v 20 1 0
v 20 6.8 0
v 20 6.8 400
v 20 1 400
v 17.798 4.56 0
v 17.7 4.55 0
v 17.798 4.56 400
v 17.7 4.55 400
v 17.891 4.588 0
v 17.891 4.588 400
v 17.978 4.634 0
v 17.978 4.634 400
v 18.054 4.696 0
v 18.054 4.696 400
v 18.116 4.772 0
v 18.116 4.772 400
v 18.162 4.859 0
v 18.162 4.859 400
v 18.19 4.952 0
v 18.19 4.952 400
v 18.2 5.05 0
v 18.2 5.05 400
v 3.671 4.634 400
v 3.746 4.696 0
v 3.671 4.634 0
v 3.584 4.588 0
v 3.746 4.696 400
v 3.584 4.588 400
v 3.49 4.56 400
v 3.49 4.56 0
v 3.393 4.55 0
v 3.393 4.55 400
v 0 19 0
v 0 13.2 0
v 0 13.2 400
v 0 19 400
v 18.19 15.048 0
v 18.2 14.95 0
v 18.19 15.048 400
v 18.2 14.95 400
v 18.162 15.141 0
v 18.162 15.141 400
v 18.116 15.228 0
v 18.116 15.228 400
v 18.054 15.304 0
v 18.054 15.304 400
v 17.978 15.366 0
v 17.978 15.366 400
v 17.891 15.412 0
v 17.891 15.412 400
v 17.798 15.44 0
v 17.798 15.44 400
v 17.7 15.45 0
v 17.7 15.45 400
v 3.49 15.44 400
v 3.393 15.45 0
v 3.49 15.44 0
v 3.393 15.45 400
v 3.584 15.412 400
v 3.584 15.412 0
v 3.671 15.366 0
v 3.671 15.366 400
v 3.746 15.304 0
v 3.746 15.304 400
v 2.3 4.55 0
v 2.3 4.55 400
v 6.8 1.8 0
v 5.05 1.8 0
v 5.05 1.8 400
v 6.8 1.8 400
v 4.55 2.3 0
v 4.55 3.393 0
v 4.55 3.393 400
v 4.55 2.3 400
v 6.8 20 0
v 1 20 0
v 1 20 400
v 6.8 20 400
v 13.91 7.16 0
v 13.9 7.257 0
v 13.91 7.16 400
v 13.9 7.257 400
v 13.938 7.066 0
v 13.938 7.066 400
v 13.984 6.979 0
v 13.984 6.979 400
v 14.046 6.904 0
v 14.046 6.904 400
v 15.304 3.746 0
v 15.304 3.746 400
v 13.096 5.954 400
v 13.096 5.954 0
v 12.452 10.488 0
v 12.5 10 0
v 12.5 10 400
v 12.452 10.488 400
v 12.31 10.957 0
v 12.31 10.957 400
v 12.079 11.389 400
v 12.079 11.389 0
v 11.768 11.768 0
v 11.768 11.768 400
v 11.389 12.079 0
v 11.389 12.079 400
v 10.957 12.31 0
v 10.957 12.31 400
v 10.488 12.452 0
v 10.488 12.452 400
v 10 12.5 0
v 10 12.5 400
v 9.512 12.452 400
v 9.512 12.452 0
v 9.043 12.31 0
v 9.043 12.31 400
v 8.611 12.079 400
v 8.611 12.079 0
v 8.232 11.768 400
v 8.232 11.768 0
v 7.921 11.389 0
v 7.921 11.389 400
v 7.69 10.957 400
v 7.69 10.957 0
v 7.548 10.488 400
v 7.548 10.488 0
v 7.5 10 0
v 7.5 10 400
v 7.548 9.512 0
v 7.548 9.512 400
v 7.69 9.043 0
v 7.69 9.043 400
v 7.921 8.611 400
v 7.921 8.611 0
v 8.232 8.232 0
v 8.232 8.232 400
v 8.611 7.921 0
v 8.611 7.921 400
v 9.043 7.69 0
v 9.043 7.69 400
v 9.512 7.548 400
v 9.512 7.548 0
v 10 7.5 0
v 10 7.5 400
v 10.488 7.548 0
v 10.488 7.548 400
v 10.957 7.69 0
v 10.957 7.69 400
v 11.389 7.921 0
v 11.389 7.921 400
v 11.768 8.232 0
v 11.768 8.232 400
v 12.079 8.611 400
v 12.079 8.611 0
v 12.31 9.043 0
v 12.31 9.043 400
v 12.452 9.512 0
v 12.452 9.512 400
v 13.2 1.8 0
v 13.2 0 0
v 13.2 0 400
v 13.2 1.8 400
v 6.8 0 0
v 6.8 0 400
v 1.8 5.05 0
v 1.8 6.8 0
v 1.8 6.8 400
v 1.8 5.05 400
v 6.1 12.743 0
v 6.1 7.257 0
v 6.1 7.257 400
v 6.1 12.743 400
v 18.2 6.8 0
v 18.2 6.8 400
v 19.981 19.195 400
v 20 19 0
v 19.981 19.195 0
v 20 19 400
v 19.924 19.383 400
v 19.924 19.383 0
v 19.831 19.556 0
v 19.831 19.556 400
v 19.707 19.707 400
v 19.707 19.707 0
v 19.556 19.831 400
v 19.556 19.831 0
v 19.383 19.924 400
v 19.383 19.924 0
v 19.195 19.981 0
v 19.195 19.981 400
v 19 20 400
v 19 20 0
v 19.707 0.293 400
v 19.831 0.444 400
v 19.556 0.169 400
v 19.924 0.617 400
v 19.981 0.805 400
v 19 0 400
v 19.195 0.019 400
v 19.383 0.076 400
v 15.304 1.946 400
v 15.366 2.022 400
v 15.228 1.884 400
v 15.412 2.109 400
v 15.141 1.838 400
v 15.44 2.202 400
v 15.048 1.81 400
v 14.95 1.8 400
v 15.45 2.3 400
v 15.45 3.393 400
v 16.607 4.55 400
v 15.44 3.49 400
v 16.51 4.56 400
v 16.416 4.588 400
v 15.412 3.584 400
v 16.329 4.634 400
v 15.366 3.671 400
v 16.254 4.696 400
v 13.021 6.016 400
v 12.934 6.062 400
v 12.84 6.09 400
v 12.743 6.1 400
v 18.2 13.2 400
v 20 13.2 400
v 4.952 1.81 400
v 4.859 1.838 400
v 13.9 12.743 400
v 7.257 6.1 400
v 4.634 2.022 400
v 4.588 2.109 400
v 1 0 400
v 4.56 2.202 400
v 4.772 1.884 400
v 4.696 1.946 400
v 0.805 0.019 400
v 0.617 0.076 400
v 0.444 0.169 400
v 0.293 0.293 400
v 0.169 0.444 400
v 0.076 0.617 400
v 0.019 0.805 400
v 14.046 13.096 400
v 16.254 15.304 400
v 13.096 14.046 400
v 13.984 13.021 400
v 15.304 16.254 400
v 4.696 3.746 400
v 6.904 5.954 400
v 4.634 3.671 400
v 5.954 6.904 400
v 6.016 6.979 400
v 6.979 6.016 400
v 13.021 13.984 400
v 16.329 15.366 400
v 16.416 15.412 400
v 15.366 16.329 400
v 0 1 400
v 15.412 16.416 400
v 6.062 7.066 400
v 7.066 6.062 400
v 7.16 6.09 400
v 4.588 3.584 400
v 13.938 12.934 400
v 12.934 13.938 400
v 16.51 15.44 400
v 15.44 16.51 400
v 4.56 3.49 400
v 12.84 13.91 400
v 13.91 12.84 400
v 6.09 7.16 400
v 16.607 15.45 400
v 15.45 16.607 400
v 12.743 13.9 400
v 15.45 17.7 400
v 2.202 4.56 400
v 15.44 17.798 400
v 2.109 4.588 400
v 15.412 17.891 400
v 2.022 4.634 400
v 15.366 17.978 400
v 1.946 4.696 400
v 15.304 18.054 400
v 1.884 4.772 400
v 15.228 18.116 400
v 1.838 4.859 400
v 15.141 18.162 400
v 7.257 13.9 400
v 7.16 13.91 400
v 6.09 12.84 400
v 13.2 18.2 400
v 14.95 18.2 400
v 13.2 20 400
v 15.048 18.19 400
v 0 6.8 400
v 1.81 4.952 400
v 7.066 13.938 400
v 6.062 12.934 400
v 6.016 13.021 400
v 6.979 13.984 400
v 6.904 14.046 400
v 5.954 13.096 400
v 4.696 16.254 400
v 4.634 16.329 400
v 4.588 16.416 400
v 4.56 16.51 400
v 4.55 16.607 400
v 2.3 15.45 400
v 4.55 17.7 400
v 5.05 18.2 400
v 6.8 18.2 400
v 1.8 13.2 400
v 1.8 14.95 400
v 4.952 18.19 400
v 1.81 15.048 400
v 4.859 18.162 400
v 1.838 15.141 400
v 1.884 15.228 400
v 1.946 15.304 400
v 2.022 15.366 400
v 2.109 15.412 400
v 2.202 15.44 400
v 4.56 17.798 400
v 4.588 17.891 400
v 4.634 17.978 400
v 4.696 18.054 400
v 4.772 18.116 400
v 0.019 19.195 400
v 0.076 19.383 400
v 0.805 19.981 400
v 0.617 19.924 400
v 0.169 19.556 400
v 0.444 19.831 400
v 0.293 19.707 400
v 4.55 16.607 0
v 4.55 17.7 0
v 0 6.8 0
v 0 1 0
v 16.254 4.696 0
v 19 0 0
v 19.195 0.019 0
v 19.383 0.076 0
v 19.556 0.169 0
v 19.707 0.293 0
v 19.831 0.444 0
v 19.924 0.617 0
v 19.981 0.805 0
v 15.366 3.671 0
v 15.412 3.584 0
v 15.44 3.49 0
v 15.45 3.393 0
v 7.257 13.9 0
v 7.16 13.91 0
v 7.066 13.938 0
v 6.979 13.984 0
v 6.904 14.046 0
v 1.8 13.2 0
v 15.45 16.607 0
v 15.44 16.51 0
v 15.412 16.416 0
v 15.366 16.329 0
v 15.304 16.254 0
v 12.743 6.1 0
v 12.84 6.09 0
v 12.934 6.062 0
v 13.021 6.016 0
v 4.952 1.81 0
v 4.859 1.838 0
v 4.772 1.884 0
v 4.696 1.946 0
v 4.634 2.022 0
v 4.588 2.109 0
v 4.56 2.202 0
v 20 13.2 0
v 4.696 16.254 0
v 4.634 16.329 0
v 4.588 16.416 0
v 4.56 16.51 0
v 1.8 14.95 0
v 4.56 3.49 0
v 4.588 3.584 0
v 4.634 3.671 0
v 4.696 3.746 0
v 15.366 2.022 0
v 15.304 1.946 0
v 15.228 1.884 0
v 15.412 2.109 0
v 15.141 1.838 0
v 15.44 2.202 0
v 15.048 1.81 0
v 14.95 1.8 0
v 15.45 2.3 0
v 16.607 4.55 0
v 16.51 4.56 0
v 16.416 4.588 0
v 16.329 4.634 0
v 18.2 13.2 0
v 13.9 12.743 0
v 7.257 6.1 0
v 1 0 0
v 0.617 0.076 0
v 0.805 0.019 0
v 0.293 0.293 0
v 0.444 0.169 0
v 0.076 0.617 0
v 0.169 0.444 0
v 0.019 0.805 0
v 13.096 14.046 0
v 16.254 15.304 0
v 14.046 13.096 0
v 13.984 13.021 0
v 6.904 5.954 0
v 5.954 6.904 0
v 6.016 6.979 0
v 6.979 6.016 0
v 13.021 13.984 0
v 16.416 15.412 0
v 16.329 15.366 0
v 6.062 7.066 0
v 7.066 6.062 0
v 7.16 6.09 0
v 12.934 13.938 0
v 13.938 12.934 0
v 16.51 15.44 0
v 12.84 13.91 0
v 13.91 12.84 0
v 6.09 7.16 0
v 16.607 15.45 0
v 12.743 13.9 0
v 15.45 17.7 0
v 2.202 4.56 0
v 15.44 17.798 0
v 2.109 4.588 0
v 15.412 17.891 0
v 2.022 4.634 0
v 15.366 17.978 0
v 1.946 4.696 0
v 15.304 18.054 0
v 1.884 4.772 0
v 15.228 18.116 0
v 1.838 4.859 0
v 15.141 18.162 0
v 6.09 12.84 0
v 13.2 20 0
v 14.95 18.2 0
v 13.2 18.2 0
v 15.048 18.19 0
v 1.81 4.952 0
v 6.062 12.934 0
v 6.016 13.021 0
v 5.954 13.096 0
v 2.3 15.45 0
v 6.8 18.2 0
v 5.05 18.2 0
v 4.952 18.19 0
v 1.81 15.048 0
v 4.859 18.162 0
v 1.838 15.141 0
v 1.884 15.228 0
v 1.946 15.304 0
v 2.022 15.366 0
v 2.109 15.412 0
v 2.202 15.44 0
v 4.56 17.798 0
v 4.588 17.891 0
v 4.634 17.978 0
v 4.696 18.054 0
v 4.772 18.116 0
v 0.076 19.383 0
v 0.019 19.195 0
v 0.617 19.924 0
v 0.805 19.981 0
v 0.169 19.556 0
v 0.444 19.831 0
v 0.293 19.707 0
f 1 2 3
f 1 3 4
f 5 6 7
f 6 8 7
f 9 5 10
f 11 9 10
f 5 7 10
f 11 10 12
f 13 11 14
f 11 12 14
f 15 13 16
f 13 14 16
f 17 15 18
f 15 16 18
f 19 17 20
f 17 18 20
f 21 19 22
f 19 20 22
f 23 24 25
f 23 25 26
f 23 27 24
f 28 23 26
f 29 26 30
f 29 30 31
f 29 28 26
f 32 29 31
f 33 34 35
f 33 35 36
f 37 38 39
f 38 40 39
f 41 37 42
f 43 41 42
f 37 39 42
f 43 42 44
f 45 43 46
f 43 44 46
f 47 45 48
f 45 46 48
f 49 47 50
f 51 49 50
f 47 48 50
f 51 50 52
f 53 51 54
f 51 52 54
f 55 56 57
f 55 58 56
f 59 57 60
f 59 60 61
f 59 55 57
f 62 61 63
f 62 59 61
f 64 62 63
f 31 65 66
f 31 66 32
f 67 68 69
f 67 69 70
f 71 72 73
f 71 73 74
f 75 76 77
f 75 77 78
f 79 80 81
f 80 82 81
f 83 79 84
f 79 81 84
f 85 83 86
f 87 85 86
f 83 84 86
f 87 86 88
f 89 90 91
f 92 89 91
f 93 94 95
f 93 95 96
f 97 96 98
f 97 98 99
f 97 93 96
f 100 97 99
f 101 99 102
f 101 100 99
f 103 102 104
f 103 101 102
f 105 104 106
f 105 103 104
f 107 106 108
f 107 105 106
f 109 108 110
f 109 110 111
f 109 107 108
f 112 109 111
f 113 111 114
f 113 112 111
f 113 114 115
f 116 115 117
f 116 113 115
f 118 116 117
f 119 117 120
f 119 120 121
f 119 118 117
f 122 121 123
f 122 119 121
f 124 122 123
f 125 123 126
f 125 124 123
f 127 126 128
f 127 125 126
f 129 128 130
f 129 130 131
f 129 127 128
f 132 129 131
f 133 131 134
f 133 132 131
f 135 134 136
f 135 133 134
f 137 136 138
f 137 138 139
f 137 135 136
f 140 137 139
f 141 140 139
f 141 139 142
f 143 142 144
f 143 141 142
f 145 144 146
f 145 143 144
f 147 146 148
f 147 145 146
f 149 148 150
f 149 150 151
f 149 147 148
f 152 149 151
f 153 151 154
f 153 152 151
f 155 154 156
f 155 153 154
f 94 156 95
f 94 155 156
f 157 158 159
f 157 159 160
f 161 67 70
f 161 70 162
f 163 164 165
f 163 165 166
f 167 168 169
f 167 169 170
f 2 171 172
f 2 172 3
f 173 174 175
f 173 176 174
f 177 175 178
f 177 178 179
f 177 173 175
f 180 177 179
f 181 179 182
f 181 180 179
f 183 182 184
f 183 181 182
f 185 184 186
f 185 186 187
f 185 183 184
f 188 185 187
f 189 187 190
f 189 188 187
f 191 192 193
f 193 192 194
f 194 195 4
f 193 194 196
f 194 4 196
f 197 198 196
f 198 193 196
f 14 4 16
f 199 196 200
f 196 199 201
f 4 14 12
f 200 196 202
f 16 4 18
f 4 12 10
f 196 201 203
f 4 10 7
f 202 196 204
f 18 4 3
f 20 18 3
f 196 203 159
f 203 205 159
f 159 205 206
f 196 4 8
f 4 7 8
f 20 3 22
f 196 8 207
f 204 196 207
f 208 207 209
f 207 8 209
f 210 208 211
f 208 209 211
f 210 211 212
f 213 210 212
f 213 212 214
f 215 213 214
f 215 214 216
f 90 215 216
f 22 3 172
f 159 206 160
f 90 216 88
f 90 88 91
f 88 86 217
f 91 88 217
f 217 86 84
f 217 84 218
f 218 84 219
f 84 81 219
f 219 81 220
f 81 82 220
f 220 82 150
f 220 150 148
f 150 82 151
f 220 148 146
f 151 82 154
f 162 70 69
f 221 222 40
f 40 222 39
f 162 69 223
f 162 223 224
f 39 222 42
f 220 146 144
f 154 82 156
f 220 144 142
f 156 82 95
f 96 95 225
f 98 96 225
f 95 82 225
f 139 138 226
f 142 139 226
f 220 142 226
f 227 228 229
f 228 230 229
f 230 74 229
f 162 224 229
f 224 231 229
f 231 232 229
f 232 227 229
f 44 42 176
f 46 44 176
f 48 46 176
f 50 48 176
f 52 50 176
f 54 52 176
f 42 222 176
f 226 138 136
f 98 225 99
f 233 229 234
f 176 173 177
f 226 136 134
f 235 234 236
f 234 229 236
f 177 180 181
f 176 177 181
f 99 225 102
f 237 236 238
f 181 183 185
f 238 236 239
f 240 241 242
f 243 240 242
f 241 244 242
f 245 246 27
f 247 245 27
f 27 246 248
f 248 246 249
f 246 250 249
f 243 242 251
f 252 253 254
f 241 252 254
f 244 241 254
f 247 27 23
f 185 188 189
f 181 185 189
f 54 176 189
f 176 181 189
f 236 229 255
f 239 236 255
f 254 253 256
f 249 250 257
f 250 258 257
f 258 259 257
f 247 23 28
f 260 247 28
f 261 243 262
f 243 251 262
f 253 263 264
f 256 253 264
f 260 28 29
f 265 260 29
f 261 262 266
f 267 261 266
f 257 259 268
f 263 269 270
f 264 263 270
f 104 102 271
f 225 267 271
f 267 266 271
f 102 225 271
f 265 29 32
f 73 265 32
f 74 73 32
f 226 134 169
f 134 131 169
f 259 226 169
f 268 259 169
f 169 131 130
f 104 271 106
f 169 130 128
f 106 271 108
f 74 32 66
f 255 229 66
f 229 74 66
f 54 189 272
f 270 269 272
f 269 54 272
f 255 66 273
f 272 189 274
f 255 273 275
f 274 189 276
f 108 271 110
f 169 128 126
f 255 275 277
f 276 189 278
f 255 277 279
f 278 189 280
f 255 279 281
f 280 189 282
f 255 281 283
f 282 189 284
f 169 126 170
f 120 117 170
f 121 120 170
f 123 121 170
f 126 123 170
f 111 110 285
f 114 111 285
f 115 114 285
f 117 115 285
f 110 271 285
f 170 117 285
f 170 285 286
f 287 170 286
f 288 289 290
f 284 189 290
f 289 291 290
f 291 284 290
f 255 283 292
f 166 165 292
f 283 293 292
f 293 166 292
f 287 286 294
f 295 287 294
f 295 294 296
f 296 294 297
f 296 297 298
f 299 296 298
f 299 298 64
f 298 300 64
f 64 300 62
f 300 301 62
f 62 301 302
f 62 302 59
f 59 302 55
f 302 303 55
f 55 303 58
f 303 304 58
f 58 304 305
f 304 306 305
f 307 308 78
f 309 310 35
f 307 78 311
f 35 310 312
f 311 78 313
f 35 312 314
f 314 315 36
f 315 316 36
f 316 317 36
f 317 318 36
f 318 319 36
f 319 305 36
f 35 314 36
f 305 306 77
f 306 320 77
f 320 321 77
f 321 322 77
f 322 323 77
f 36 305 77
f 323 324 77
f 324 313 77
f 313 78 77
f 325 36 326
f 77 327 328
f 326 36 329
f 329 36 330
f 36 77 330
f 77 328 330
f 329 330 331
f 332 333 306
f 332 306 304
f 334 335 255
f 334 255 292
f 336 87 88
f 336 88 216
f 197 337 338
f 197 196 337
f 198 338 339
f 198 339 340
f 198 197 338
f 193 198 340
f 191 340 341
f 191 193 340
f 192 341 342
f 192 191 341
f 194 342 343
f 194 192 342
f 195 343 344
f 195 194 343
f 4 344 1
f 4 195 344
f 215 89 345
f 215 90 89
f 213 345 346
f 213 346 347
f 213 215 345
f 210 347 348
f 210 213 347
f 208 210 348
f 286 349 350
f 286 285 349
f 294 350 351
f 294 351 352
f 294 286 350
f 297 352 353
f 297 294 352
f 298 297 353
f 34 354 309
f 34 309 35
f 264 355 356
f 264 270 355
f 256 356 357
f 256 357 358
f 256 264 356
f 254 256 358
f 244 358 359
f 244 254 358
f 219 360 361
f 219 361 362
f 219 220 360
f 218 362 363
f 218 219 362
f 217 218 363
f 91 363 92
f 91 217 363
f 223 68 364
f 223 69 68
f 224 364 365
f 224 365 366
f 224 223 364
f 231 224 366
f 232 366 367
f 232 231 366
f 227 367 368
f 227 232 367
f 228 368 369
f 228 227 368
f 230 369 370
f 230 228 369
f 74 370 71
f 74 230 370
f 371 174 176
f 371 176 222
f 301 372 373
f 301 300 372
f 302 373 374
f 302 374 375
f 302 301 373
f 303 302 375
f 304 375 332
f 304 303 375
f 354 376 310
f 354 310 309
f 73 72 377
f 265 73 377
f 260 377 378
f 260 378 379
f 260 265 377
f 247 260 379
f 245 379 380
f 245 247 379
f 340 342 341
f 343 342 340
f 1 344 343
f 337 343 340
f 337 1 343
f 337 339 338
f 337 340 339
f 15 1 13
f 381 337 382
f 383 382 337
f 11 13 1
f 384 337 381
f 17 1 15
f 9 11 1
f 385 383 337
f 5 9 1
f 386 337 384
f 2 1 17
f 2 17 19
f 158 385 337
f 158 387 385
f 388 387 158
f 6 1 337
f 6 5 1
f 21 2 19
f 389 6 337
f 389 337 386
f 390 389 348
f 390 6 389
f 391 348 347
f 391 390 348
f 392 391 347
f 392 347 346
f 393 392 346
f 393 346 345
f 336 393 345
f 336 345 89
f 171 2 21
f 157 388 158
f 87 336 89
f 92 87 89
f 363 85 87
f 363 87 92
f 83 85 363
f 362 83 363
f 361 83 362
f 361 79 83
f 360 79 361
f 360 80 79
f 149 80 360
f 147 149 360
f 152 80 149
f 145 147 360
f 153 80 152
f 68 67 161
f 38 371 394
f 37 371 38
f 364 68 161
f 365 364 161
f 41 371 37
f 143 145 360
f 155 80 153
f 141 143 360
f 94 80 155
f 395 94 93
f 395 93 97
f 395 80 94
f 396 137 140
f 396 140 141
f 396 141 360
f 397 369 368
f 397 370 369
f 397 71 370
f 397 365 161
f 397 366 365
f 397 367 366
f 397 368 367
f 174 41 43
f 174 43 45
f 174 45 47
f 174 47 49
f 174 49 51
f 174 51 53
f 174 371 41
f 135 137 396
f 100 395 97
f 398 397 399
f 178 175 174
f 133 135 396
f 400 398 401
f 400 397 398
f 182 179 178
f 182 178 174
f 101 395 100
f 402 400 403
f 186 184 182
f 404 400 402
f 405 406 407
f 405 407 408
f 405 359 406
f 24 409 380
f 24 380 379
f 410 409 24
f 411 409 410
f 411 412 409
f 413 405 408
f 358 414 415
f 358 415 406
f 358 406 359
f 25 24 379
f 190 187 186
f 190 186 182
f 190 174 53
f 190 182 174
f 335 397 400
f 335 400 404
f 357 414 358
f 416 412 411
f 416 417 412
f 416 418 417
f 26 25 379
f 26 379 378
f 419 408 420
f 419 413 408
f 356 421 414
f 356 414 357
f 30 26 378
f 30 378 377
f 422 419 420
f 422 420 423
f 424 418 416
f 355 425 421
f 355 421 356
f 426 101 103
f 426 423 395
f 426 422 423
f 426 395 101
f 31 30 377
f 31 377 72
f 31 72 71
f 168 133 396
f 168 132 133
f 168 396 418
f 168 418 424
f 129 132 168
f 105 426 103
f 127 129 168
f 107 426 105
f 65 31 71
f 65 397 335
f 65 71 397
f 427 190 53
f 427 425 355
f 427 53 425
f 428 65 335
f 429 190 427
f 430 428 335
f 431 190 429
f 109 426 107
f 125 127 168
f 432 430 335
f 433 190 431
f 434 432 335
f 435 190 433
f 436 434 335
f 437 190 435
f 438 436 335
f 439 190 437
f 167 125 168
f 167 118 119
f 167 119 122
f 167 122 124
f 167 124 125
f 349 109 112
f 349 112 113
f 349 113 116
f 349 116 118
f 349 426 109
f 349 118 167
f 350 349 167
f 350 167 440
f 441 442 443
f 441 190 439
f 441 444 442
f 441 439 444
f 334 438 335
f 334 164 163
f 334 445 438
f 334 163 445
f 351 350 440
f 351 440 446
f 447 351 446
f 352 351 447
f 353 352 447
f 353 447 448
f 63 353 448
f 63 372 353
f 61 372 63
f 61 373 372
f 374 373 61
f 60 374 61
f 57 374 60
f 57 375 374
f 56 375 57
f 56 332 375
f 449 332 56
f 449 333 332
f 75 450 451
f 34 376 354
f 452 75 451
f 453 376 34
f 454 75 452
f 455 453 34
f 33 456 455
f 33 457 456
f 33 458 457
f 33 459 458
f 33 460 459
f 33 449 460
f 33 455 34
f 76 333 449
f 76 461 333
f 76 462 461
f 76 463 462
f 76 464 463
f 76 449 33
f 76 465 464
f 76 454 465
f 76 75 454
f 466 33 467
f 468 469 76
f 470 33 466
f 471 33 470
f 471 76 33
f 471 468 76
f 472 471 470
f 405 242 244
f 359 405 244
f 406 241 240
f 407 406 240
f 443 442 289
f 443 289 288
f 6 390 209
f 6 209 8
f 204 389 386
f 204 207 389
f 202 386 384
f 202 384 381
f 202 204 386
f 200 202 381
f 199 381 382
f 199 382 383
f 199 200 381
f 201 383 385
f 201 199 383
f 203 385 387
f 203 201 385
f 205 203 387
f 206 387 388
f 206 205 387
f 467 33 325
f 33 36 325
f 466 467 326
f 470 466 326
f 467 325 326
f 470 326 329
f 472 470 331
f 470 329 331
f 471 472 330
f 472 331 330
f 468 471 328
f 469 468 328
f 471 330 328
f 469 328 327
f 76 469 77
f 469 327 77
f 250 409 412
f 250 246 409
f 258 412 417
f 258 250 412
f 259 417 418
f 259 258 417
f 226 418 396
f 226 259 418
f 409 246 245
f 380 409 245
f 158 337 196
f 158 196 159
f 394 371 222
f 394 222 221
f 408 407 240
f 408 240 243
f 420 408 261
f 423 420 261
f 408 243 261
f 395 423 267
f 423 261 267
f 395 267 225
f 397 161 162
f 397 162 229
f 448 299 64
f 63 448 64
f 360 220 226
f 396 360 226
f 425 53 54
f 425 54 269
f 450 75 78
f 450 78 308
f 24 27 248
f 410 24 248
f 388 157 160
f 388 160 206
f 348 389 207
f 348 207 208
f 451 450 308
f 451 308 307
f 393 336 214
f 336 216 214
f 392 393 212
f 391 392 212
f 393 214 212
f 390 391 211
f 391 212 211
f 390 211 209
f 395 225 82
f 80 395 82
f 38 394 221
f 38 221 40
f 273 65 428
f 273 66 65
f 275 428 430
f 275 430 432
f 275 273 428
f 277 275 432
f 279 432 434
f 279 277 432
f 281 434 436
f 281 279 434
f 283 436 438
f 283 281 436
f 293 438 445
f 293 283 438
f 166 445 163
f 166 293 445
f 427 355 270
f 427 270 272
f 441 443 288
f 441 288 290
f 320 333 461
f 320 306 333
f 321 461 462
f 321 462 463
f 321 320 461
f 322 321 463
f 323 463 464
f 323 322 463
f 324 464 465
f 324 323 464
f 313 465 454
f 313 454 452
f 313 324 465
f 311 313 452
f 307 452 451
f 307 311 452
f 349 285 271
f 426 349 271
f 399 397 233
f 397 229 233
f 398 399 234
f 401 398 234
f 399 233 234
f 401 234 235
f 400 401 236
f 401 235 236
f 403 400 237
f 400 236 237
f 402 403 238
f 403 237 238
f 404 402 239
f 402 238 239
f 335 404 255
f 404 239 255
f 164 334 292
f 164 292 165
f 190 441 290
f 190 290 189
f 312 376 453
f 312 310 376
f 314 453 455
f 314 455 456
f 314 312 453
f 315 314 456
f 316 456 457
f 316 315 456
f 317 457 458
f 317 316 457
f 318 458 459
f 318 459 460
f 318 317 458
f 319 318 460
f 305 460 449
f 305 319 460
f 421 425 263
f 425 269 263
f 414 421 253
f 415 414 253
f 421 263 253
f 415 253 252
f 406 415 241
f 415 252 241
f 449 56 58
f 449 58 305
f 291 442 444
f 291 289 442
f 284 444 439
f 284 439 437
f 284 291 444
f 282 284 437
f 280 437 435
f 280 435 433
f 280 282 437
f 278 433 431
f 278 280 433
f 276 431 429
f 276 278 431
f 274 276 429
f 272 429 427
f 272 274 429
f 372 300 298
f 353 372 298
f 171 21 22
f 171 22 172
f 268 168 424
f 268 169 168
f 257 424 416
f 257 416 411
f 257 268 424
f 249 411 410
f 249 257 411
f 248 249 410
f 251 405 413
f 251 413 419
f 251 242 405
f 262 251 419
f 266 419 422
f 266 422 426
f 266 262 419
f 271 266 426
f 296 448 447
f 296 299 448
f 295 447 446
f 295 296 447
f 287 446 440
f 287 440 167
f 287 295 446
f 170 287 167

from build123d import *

# Parameters (mm, degrees)
SKETCH1_R           = 2.5
BOSS_EXTRUDE1_DEPTH = 400
FILLET1_R           = 1
FILLET2_R           = 0.5
FILLET3_R           = 0.5
FILLET4_R           = 0.5
FILLET5_R           = 0.5


with BuildPart() as part:
    # Sketch1 → Boss-Extrude1 (new body)
    with BuildSketch(Plane.XY):
        Polygon((13.2, 0), (13.2, 1.8), (15.45, 1.8), (15.45, 3.6), (12.95, 6.1), (7.05, 6.1), (4.55, 3.6), (4.55, 1.8), (6.8, 1.8), (6.8, 0), (0, 0), (0, 6.8), (1.8, 6.8), (1.8, 4.55), (3.6, 4.55), (6.1, 7.05), (6.1, 12.95), (3.6, 15.45), (1.8, 15.45), (1.8, 13.2), (0, 13.2), (0, 20), (6.8, 20), (6.8, 18.2), (4.55, 18.2), (4.55, 16.4), (7.05, 13.9), (12.95, 13.9), (15.45, 16.4), (15.45, 18.2), (13.2, 18.2), (13.2, 20), (20, 20), (20, 13.2), (18.2, 13.2), (18.2, 15.45), (16.4, 15.45), (13.9, 12.95), (13.9, 7.05), (16.4, 4.55), (18.2, 4.55), (18.2, 6.8), (20, 6.8), (20, 0), align=None)
        with Locations((10, 10)):
            Circle(SKETCH1_R, mode=Mode.SUBTRACT)
    extrude(amount=BOSS_EXTRUDE1_DEPTH)

    # Fillet1
    fillet1_edges = [part.edges().sort_by_distance(p)[0] for p in [
        (0, 0, 200),
        (0, 20, 200),
        (20, 20, 200),
        (20, 0, 200),
    ]]
    fillet(fillet1_edges, radius=FILLET1_R)

    # Fillet2
    fillet2_edges = [part.edges().sort_by_distance(p)[0] for p in [
        (4.55, 18.2, 200),
        (4.55, 16.4, 200),
        (7.05, 13.9, 200),
        (12.95, 13.9, 200),
        (15.45, 16.4, 200),
        (15.45, 18.2, 200),
    ]]
    fillet(fillet2_edges, radius=FILLET2_R)

    # Fillet3
    fillet3_edges = [part.edges().sort_by_distance(p)[0] for p in [
        (18.2, 15.45, 200),
        (16.4, 15.45, 200),
        (13.9, 12.95, 200),
        (13.9, 7.05, 200),
        (16.4, 4.55, 200),
        (18.2, 4.55, 200),
    ]]
    fillet(fillet3_edges, radius=FILLET3_R)

    # Fillet4
    fillet4_edges = [part.edges().sort_by_distance(p)[0] for p in [
        (1.8, 4.55, 200),
        (3.6, 4.55, 200),
        (6.1, 7.05, 200),
        (6.1, 12.95, 200),
        (3.6, 15.45, 200),
        (1.8, 15.45, 200),
    ]]
    fillet(fillet4_edges, radius=FILLET4_R)

    # Fillet5
    fillet5_edges = [part.edges().sort_by_distance(p)[0] for p in [
        (15.45, 1.8, 200),
        (15.45, 3.6, 200),
        (12.95, 6.1, 200),
        (7.05, 6.1, 200),
        (4.55, 3.6, 200),
        (4.55, 1.8, 200),
    ]]
    fillet(fillet5_edges, radius=FILLET5_R)


solid = part.part
